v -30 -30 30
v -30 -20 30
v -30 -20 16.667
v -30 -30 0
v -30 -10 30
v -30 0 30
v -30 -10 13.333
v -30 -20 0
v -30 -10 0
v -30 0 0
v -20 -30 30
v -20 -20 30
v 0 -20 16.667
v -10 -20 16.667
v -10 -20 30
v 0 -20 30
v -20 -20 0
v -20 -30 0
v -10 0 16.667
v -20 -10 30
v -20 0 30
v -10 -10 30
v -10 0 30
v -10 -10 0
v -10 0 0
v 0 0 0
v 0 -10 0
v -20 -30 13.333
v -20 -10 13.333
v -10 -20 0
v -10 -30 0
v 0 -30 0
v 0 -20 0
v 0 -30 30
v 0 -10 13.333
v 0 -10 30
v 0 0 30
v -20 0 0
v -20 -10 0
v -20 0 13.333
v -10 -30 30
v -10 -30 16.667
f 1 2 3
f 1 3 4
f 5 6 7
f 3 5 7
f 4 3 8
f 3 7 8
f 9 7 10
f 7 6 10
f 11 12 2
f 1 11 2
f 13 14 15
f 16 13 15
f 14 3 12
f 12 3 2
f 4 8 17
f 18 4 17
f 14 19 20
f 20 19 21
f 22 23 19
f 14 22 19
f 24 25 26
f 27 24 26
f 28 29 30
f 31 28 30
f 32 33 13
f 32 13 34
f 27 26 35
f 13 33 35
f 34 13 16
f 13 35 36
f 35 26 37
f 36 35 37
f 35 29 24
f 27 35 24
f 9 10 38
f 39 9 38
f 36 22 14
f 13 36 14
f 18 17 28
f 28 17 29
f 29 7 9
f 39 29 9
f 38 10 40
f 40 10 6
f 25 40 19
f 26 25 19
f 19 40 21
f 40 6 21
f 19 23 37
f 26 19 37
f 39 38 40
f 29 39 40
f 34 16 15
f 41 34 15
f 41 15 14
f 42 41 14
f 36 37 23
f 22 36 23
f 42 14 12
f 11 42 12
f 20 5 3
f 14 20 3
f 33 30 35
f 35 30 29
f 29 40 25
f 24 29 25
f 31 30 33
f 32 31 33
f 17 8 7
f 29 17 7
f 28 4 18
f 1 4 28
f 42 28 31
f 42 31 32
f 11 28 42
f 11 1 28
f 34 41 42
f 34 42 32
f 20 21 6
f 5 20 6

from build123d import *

# Parameters (mm, degrees)
F1_DEPTH = 30
F3_DEPTH = 30.001


with BuildPart() as f1:
    # F0 (on Front) → F1 (new body)
    with BuildSketch(Plane.XZ):
        Polygon((-30, 30), (-30, 0), (-20, 0), (-20, 13.333333), (-10, 0), (0, 0), (0, 30), (-10, 30), (-10, 16.666667), (-20, 30), align=None)
    extrude(amount=F1_DEPTH)

    # F2 (on face) → F3 (cut, through all)
    with BuildSketch(Plane(origin=(-30, 0, 0), x_dir=(0, -1, 0), z_dir=(-1, 0, 0))):
        Polygon((20, 30), (10, 30), (20, 16.666667), align=None)
        Polygon((10, 13.333333), (10, 0), (20, 0), align=None)
    extrude(amount=-F3_DEPTH, mode=Mode.SUBTRACT)


solid = f1.part
